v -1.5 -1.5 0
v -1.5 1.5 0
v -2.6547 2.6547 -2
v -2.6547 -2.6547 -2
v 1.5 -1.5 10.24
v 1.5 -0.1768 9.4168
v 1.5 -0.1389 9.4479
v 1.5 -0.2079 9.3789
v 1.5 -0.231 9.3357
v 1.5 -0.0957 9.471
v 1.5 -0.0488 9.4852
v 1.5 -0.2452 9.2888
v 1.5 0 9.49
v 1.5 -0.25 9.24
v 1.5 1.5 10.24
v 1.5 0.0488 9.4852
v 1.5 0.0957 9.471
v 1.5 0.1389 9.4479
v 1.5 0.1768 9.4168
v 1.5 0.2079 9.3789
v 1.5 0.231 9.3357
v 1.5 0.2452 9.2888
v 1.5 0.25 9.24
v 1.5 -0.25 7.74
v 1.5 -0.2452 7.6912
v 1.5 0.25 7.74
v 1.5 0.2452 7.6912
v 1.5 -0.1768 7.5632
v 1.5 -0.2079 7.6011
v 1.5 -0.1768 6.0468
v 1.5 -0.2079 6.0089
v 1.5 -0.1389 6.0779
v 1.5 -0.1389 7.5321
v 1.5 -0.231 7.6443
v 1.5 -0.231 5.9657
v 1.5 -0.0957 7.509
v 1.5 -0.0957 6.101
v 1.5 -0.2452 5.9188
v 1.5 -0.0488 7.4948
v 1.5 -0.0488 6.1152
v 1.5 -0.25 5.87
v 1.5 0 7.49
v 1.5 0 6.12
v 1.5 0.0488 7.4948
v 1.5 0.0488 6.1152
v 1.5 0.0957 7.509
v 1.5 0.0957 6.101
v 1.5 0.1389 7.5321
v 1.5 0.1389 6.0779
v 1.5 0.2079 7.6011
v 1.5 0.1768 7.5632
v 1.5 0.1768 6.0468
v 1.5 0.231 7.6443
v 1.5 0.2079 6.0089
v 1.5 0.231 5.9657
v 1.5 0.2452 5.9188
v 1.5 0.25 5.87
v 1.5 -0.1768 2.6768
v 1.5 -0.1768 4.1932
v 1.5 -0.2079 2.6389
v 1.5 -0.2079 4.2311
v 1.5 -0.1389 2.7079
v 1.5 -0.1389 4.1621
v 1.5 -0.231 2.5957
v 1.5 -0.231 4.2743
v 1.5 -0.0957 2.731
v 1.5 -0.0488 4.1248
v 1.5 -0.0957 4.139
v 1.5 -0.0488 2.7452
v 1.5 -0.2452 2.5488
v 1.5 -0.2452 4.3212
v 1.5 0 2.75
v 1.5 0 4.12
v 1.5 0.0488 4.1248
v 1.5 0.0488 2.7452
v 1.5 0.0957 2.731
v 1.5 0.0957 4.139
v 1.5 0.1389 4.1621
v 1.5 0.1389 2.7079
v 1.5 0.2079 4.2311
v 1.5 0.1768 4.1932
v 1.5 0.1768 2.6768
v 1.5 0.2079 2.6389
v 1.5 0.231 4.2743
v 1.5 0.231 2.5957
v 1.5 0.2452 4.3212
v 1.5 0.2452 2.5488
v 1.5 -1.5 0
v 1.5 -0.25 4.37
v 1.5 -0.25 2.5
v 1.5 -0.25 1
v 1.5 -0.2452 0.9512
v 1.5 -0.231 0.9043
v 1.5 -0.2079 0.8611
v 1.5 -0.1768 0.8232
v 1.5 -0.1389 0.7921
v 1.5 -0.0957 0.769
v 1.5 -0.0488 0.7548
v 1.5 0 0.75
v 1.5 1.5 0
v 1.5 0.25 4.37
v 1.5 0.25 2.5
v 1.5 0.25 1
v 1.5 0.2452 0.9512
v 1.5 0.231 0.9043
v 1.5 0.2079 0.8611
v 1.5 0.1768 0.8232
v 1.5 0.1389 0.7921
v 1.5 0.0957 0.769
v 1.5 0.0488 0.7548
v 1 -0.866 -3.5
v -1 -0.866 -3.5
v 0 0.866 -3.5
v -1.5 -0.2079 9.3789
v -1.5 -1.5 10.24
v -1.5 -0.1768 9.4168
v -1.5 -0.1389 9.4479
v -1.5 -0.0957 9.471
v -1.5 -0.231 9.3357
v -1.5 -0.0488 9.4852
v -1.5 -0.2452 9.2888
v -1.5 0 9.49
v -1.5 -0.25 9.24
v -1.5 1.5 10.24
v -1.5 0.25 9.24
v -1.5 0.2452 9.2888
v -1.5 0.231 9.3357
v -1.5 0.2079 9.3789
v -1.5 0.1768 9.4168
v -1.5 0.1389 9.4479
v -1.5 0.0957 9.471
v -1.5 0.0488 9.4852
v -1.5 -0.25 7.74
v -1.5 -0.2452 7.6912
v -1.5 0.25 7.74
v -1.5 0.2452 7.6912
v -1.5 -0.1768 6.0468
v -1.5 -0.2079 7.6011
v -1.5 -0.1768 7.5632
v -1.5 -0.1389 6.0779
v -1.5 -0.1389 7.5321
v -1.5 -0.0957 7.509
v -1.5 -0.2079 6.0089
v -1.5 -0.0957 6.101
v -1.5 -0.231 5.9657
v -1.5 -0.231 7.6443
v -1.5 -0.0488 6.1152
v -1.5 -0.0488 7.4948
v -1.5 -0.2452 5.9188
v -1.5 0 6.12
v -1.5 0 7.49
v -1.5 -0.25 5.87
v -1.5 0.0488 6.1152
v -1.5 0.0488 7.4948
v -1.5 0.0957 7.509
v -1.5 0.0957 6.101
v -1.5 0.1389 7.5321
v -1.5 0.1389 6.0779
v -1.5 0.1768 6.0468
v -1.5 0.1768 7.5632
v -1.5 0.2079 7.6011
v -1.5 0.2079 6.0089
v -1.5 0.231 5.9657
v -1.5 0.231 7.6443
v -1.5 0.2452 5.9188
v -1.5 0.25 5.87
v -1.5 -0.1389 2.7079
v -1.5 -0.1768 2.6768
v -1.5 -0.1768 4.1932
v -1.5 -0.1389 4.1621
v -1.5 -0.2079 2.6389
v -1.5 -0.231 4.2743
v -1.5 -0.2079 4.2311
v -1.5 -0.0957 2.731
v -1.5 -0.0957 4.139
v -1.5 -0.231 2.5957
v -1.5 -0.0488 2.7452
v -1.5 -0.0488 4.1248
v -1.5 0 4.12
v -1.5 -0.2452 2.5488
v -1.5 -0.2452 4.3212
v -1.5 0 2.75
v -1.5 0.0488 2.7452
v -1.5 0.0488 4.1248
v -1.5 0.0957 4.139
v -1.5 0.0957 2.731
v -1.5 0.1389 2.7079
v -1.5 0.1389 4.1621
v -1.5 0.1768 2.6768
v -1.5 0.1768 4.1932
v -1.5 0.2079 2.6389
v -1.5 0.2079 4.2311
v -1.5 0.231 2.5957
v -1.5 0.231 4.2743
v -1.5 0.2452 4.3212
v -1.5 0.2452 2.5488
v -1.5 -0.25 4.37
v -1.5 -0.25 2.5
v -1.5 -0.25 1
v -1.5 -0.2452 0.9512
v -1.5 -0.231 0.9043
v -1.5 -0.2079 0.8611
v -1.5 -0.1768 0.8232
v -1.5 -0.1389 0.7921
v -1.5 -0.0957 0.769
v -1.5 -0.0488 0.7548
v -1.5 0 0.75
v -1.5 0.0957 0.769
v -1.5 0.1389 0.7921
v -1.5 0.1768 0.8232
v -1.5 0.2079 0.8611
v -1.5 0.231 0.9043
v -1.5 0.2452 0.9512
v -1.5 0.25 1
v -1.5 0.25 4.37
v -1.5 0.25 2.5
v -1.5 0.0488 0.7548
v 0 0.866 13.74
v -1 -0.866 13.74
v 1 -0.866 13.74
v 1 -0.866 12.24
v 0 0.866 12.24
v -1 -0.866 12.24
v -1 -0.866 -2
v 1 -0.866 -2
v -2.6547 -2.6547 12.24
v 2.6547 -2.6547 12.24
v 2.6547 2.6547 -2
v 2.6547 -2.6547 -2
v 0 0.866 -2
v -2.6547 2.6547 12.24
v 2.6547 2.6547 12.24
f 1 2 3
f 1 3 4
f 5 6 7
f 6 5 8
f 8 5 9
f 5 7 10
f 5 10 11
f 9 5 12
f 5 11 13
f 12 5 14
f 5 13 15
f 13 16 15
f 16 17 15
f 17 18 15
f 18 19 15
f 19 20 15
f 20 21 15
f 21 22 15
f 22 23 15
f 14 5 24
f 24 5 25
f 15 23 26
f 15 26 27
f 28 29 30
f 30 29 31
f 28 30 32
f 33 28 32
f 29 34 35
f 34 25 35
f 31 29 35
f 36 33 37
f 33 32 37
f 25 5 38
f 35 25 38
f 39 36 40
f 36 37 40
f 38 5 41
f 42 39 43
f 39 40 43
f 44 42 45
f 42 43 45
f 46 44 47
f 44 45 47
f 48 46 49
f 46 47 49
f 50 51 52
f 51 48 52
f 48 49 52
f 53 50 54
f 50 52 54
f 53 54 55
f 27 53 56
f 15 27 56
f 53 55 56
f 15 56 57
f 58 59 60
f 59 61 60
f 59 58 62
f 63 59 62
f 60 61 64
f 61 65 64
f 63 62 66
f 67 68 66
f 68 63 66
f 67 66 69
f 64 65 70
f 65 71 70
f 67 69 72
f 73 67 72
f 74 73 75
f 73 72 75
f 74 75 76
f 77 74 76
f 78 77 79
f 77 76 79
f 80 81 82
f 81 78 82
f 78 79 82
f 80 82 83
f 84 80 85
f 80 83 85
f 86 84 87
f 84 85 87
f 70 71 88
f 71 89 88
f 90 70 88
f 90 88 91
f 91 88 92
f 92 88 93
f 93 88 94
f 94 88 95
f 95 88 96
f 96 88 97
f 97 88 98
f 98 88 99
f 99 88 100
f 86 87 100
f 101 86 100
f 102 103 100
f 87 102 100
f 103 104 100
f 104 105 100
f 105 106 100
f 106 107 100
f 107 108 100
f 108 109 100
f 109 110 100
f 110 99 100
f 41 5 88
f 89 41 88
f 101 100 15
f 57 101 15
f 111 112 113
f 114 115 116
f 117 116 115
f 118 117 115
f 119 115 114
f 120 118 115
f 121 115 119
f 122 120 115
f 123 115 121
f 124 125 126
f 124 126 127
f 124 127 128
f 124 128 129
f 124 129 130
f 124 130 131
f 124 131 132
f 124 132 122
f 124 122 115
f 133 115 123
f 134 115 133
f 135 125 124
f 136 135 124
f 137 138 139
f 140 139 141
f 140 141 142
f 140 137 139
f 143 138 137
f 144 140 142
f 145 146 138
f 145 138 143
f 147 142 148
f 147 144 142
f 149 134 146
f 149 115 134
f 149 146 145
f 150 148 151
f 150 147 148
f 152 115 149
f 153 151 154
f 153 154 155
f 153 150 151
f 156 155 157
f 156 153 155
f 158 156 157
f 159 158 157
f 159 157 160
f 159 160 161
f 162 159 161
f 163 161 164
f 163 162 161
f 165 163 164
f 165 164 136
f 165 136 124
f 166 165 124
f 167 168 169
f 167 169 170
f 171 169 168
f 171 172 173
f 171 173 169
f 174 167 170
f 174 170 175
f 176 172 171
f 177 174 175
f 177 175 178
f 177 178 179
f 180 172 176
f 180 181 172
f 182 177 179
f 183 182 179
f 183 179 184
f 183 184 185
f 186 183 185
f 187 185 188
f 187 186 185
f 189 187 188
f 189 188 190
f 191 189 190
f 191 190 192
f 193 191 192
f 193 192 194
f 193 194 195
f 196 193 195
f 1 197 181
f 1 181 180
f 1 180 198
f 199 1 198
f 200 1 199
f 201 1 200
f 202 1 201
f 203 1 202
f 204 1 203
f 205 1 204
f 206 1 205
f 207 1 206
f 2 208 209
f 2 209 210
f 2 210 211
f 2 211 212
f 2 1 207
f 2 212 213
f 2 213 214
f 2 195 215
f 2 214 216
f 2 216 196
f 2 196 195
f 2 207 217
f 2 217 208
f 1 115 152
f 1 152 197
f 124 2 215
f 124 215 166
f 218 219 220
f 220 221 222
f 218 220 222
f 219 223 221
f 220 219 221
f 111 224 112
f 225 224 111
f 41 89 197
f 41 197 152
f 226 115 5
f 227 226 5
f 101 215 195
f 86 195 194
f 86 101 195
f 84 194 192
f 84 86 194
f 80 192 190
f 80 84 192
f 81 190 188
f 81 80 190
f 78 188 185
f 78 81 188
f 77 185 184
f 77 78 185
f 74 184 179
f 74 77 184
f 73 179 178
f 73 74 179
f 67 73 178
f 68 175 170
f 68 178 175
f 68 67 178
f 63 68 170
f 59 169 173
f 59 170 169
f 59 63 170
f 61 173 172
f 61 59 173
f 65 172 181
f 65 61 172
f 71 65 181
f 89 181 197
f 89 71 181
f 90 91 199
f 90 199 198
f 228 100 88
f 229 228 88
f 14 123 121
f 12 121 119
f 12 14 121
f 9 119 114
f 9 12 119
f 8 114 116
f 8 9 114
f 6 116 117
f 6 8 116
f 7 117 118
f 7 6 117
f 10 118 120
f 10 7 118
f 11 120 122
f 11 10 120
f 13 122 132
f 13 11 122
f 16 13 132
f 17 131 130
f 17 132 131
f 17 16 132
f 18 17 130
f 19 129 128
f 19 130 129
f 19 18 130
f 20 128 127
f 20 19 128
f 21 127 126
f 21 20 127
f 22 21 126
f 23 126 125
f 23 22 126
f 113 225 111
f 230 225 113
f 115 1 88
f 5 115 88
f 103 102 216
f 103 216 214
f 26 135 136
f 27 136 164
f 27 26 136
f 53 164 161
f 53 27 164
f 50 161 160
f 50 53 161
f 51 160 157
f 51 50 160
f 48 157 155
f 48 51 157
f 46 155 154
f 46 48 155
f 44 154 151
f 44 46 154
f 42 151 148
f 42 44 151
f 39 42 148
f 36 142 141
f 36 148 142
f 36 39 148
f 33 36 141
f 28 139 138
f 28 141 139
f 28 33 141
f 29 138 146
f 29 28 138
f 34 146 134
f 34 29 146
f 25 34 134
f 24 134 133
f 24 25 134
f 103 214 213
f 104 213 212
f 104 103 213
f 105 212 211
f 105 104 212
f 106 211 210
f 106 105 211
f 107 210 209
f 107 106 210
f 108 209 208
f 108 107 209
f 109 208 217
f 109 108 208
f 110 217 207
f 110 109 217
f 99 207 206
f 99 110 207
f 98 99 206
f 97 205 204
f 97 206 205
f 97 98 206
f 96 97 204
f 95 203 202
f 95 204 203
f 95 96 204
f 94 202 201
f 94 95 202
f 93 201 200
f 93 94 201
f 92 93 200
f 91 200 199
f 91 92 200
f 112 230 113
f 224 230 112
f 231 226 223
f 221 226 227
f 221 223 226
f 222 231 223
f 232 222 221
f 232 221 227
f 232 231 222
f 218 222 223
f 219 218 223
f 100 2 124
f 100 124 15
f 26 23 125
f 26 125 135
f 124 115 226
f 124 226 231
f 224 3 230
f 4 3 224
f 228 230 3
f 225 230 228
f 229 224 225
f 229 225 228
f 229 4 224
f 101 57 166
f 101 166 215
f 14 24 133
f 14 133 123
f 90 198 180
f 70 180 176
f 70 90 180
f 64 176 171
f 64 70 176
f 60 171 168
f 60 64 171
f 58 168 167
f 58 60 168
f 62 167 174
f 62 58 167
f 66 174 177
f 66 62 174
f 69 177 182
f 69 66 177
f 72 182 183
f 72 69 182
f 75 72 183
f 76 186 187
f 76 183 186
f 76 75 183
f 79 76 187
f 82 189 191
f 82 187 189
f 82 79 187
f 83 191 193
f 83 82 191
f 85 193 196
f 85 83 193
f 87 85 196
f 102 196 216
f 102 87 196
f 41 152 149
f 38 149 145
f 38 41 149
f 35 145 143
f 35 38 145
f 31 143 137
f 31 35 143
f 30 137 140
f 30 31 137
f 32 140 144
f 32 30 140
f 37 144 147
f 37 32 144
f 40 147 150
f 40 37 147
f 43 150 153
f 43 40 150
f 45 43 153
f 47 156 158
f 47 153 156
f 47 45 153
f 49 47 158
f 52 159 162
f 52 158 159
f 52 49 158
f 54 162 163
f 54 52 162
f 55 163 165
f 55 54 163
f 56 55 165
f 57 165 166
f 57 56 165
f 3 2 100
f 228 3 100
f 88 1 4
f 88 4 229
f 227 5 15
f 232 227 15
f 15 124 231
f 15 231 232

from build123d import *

# Parameters (mm, degrees)
SKETCH1_W               = 3
SKETCH1_H               = 3
BOSS_EXTRUDE1_DEPTH     = 10.24
SKETCH2_W               = 3
SKETCH2_H               = 3
BOSS_EXTRUDE2_DEPTH     = 2
BOSS_EXTRUDE2_DRAFT     = -30
MIRROR1_COPY_1_SKETCH_W = 3
MIRROR1_COPY_1_SKETCH_H = 3
MIRROR1_COPY_1_DEPTH    = 2
MIRROR1_COPY_1_DRAFT    = -30
BOSS_EXTRUDE3_DEPTH     = 1.5
CUT_EXTRUDE1_REACH      = 16.598


with BuildPart() as part:
    # Sketch1 → Boss-Extrude1 (new body)
    with BuildSketch(Plane.XY):
        Rectangle(SKETCH1_W, SKETCH1_H)
    extrude(amount=BOSS_EXTRUDE1_DEPTH)


with BuildPart() as boss_extrude2_tool:
    # Sketch2 → Boss-Extrude2 (with draft: the straight prism first)
    with BuildSketch(Plane.XY.offset(10.24)):
        Rectangle(SKETCH2_W, SKETCH2_H)
    extrude(amount=BOSS_EXTRUDE2_DEPTH)
    # Boss-Extrude2: the draft: its side faces are tilted about the plane it starts from
    boss_extrude2_sides = [boss_extrude2_tool.faces().sort_by_distance(p)[0] for p in [
        (1.5, 0, 11.24),
        (0, 1.5, 11.24),
        (-1.5, 0, 11.24),
        (0, -1.5, 11.24),
    ]]
    draft(boss_extrude2_sides, Plane.XY.offset(10.24), BOSS_EXTRUDE2_DRAFT)


with BuildPart() as part_1:
    add(part.part)

    # Boss-Extrude2: add boss_extrude2_tool
    add(boss_extrude2_tool.part)


with BuildPart() as mirror1_copy_1_tool:
    # Mirror1 copy 1 sketch → Mirror1 copy 1 (with draft: the straight prism first)
    with BuildSketch(Plane(origin=(0, 0, 0), x_dir=(1, 0, 0), z_dir=(0, 0, -1))):
        Rectangle(MIRROR1_COPY_1_SKETCH_W, MIRROR1_COPY_1_SKETCH_H)
    extrude(amount=MIRROR1_COPY_1_DEPTH)
    # Mirror1 copy 1: the draft: its side faces are tilted about the plane it starts from
    mirror1_copy_1_sides = [mirror1_copy_1_tool.faces().sort_by_distance(p)[0] for p in [
        (1.5, 0, -1),
        (0, 1.5, -1),
        (-1.5, 0, -1),
        (0, -1.5, -1),
    ]]
    draft(mirror1_copy_1_sides, Plane(origin=(0, 0, 0), x_dir=(1, 0, 0), z_dir=(0, 0, -1)), MIRROR1_COPY_1_DRAFT)


with BuildPart() as part_2:
    add(part_1.part)

    # Mirror1 copy 1: add mirror1_copy_1_tool
    add(mirror1_copy_1_tool.part)

    # Sketch3 → Boss-Extrude3 (add)
    with BuildSketch(Plane.XY.offset(12.24)):
        Polygon((0, 0.866025404), (-1, -0.866025404), (1, -0.866025404), align=None)
    boss_extrude3 = extrude(amount=BOSS_EXTRUDE3_DEPTH)

    # Mirror2: Boss-Extrude3 across plane
    add(boss_extrude3.mirror(Plane.XY.offset(5.12)))

    # Sketch7 → Cut-Extrude1 (cut, up to next)
    with BuildSketch(Plane(origin=(1.5, 0, 0), x_dir=(0, 0, -1), z_dir=(1, 0, 0)), mode=Mode.PRIVATE) as cut_extrude1_sk1:
        with BuildLine():
            Line((-9.24, 0.25), (-7.74, 0.25))
            ThreePointArc((-7.74, 0.25), (-7.49, 0), (-7.74, -0.25))
            Line((-7.74, -0.25), (-9.24, -0.25))
            ThreePointArc((-9.24, -0.25), (-9.49, 0), (-9.24, 0.25))
        make_face()
    cut_extrude1_tool1 = extrude(cut_extrude1_sk1.sketch, amount=-CUT_EXTRUDE1_REACH, mode=Mode.PRIVATE) & part_2.part
    # Sketch7 → Cut-Extrude1 (cut, up to next)
    with BuildSketch(Plane(origin=(1.5, 0, 0), x_dir=(0, 0, -1), z_dir=(1, 0, 0)), mode=Mode.PRIVATE) as cut_extrude1_sk2:
        with BuildLine():
            Line((-5.87, 0.25), (-4.37, 0.25))
            ThreePointArc((-4.37, 0.25), (-4.12, 0), (-4.37, -0.25))
            Line((-4.37, -0.25), (-5.87, -0.25))
            ThreePointArc((-5.87, -0.25), (-6.12, 0), (-5.87, 0.25))
        make_face()
    cut_extrude1_tool2 = extrude(cut_extrude1_sk2.sketch, amount=-CUT_EXTRUDE1_REACH, mode=Mode.PRIVATE) & part_2.part
    # Sketch7 → Cut-Extrude1 (cut, up to next)
    with BuildSketch(Plane(origin=(1.5, 0, 0), x_dir=(0, 0, -1), z_dir=(1, 0, 0)), mode=Mode.PRIVATE) as cut_extrude1_sk3:
        with BuildLine():
            Line((-2.5, 0.25), (-1, 0.25))
            ThreePointArc((-1, 0.25), (-0.75, 0), (-1, -0.25))
            Line((-1, -0.25), (-2.5, -0.25))
            ThreePointArc((-2.5, -0.25), (-2.75, 0), (-2.5, 0.25))
        make_face()
    cut_extrude1_tool3 = extrude(cut_extrude1_sk3.sketch, amount=-CUT_EXTRUDE1_REACH, mode=Mode.PRIVATE) & part_2.part
    add(cut_extrude1_tool1.solids().sort_by_distance((1.5, 0, 8.49))[0], mode=Mode.SUBTRACT)
    add(cut_extrude1_tool2.solids().sort_by_distance((1.5, 0, 5.12))[0], mode=Mode.SUBTRACT)
    add(cut_extrude1_tool3.solids().sort_by_distance((1.5, 0, 1.75))[0], mode=Mode.SUBTRACT)


solid = part_2.part
